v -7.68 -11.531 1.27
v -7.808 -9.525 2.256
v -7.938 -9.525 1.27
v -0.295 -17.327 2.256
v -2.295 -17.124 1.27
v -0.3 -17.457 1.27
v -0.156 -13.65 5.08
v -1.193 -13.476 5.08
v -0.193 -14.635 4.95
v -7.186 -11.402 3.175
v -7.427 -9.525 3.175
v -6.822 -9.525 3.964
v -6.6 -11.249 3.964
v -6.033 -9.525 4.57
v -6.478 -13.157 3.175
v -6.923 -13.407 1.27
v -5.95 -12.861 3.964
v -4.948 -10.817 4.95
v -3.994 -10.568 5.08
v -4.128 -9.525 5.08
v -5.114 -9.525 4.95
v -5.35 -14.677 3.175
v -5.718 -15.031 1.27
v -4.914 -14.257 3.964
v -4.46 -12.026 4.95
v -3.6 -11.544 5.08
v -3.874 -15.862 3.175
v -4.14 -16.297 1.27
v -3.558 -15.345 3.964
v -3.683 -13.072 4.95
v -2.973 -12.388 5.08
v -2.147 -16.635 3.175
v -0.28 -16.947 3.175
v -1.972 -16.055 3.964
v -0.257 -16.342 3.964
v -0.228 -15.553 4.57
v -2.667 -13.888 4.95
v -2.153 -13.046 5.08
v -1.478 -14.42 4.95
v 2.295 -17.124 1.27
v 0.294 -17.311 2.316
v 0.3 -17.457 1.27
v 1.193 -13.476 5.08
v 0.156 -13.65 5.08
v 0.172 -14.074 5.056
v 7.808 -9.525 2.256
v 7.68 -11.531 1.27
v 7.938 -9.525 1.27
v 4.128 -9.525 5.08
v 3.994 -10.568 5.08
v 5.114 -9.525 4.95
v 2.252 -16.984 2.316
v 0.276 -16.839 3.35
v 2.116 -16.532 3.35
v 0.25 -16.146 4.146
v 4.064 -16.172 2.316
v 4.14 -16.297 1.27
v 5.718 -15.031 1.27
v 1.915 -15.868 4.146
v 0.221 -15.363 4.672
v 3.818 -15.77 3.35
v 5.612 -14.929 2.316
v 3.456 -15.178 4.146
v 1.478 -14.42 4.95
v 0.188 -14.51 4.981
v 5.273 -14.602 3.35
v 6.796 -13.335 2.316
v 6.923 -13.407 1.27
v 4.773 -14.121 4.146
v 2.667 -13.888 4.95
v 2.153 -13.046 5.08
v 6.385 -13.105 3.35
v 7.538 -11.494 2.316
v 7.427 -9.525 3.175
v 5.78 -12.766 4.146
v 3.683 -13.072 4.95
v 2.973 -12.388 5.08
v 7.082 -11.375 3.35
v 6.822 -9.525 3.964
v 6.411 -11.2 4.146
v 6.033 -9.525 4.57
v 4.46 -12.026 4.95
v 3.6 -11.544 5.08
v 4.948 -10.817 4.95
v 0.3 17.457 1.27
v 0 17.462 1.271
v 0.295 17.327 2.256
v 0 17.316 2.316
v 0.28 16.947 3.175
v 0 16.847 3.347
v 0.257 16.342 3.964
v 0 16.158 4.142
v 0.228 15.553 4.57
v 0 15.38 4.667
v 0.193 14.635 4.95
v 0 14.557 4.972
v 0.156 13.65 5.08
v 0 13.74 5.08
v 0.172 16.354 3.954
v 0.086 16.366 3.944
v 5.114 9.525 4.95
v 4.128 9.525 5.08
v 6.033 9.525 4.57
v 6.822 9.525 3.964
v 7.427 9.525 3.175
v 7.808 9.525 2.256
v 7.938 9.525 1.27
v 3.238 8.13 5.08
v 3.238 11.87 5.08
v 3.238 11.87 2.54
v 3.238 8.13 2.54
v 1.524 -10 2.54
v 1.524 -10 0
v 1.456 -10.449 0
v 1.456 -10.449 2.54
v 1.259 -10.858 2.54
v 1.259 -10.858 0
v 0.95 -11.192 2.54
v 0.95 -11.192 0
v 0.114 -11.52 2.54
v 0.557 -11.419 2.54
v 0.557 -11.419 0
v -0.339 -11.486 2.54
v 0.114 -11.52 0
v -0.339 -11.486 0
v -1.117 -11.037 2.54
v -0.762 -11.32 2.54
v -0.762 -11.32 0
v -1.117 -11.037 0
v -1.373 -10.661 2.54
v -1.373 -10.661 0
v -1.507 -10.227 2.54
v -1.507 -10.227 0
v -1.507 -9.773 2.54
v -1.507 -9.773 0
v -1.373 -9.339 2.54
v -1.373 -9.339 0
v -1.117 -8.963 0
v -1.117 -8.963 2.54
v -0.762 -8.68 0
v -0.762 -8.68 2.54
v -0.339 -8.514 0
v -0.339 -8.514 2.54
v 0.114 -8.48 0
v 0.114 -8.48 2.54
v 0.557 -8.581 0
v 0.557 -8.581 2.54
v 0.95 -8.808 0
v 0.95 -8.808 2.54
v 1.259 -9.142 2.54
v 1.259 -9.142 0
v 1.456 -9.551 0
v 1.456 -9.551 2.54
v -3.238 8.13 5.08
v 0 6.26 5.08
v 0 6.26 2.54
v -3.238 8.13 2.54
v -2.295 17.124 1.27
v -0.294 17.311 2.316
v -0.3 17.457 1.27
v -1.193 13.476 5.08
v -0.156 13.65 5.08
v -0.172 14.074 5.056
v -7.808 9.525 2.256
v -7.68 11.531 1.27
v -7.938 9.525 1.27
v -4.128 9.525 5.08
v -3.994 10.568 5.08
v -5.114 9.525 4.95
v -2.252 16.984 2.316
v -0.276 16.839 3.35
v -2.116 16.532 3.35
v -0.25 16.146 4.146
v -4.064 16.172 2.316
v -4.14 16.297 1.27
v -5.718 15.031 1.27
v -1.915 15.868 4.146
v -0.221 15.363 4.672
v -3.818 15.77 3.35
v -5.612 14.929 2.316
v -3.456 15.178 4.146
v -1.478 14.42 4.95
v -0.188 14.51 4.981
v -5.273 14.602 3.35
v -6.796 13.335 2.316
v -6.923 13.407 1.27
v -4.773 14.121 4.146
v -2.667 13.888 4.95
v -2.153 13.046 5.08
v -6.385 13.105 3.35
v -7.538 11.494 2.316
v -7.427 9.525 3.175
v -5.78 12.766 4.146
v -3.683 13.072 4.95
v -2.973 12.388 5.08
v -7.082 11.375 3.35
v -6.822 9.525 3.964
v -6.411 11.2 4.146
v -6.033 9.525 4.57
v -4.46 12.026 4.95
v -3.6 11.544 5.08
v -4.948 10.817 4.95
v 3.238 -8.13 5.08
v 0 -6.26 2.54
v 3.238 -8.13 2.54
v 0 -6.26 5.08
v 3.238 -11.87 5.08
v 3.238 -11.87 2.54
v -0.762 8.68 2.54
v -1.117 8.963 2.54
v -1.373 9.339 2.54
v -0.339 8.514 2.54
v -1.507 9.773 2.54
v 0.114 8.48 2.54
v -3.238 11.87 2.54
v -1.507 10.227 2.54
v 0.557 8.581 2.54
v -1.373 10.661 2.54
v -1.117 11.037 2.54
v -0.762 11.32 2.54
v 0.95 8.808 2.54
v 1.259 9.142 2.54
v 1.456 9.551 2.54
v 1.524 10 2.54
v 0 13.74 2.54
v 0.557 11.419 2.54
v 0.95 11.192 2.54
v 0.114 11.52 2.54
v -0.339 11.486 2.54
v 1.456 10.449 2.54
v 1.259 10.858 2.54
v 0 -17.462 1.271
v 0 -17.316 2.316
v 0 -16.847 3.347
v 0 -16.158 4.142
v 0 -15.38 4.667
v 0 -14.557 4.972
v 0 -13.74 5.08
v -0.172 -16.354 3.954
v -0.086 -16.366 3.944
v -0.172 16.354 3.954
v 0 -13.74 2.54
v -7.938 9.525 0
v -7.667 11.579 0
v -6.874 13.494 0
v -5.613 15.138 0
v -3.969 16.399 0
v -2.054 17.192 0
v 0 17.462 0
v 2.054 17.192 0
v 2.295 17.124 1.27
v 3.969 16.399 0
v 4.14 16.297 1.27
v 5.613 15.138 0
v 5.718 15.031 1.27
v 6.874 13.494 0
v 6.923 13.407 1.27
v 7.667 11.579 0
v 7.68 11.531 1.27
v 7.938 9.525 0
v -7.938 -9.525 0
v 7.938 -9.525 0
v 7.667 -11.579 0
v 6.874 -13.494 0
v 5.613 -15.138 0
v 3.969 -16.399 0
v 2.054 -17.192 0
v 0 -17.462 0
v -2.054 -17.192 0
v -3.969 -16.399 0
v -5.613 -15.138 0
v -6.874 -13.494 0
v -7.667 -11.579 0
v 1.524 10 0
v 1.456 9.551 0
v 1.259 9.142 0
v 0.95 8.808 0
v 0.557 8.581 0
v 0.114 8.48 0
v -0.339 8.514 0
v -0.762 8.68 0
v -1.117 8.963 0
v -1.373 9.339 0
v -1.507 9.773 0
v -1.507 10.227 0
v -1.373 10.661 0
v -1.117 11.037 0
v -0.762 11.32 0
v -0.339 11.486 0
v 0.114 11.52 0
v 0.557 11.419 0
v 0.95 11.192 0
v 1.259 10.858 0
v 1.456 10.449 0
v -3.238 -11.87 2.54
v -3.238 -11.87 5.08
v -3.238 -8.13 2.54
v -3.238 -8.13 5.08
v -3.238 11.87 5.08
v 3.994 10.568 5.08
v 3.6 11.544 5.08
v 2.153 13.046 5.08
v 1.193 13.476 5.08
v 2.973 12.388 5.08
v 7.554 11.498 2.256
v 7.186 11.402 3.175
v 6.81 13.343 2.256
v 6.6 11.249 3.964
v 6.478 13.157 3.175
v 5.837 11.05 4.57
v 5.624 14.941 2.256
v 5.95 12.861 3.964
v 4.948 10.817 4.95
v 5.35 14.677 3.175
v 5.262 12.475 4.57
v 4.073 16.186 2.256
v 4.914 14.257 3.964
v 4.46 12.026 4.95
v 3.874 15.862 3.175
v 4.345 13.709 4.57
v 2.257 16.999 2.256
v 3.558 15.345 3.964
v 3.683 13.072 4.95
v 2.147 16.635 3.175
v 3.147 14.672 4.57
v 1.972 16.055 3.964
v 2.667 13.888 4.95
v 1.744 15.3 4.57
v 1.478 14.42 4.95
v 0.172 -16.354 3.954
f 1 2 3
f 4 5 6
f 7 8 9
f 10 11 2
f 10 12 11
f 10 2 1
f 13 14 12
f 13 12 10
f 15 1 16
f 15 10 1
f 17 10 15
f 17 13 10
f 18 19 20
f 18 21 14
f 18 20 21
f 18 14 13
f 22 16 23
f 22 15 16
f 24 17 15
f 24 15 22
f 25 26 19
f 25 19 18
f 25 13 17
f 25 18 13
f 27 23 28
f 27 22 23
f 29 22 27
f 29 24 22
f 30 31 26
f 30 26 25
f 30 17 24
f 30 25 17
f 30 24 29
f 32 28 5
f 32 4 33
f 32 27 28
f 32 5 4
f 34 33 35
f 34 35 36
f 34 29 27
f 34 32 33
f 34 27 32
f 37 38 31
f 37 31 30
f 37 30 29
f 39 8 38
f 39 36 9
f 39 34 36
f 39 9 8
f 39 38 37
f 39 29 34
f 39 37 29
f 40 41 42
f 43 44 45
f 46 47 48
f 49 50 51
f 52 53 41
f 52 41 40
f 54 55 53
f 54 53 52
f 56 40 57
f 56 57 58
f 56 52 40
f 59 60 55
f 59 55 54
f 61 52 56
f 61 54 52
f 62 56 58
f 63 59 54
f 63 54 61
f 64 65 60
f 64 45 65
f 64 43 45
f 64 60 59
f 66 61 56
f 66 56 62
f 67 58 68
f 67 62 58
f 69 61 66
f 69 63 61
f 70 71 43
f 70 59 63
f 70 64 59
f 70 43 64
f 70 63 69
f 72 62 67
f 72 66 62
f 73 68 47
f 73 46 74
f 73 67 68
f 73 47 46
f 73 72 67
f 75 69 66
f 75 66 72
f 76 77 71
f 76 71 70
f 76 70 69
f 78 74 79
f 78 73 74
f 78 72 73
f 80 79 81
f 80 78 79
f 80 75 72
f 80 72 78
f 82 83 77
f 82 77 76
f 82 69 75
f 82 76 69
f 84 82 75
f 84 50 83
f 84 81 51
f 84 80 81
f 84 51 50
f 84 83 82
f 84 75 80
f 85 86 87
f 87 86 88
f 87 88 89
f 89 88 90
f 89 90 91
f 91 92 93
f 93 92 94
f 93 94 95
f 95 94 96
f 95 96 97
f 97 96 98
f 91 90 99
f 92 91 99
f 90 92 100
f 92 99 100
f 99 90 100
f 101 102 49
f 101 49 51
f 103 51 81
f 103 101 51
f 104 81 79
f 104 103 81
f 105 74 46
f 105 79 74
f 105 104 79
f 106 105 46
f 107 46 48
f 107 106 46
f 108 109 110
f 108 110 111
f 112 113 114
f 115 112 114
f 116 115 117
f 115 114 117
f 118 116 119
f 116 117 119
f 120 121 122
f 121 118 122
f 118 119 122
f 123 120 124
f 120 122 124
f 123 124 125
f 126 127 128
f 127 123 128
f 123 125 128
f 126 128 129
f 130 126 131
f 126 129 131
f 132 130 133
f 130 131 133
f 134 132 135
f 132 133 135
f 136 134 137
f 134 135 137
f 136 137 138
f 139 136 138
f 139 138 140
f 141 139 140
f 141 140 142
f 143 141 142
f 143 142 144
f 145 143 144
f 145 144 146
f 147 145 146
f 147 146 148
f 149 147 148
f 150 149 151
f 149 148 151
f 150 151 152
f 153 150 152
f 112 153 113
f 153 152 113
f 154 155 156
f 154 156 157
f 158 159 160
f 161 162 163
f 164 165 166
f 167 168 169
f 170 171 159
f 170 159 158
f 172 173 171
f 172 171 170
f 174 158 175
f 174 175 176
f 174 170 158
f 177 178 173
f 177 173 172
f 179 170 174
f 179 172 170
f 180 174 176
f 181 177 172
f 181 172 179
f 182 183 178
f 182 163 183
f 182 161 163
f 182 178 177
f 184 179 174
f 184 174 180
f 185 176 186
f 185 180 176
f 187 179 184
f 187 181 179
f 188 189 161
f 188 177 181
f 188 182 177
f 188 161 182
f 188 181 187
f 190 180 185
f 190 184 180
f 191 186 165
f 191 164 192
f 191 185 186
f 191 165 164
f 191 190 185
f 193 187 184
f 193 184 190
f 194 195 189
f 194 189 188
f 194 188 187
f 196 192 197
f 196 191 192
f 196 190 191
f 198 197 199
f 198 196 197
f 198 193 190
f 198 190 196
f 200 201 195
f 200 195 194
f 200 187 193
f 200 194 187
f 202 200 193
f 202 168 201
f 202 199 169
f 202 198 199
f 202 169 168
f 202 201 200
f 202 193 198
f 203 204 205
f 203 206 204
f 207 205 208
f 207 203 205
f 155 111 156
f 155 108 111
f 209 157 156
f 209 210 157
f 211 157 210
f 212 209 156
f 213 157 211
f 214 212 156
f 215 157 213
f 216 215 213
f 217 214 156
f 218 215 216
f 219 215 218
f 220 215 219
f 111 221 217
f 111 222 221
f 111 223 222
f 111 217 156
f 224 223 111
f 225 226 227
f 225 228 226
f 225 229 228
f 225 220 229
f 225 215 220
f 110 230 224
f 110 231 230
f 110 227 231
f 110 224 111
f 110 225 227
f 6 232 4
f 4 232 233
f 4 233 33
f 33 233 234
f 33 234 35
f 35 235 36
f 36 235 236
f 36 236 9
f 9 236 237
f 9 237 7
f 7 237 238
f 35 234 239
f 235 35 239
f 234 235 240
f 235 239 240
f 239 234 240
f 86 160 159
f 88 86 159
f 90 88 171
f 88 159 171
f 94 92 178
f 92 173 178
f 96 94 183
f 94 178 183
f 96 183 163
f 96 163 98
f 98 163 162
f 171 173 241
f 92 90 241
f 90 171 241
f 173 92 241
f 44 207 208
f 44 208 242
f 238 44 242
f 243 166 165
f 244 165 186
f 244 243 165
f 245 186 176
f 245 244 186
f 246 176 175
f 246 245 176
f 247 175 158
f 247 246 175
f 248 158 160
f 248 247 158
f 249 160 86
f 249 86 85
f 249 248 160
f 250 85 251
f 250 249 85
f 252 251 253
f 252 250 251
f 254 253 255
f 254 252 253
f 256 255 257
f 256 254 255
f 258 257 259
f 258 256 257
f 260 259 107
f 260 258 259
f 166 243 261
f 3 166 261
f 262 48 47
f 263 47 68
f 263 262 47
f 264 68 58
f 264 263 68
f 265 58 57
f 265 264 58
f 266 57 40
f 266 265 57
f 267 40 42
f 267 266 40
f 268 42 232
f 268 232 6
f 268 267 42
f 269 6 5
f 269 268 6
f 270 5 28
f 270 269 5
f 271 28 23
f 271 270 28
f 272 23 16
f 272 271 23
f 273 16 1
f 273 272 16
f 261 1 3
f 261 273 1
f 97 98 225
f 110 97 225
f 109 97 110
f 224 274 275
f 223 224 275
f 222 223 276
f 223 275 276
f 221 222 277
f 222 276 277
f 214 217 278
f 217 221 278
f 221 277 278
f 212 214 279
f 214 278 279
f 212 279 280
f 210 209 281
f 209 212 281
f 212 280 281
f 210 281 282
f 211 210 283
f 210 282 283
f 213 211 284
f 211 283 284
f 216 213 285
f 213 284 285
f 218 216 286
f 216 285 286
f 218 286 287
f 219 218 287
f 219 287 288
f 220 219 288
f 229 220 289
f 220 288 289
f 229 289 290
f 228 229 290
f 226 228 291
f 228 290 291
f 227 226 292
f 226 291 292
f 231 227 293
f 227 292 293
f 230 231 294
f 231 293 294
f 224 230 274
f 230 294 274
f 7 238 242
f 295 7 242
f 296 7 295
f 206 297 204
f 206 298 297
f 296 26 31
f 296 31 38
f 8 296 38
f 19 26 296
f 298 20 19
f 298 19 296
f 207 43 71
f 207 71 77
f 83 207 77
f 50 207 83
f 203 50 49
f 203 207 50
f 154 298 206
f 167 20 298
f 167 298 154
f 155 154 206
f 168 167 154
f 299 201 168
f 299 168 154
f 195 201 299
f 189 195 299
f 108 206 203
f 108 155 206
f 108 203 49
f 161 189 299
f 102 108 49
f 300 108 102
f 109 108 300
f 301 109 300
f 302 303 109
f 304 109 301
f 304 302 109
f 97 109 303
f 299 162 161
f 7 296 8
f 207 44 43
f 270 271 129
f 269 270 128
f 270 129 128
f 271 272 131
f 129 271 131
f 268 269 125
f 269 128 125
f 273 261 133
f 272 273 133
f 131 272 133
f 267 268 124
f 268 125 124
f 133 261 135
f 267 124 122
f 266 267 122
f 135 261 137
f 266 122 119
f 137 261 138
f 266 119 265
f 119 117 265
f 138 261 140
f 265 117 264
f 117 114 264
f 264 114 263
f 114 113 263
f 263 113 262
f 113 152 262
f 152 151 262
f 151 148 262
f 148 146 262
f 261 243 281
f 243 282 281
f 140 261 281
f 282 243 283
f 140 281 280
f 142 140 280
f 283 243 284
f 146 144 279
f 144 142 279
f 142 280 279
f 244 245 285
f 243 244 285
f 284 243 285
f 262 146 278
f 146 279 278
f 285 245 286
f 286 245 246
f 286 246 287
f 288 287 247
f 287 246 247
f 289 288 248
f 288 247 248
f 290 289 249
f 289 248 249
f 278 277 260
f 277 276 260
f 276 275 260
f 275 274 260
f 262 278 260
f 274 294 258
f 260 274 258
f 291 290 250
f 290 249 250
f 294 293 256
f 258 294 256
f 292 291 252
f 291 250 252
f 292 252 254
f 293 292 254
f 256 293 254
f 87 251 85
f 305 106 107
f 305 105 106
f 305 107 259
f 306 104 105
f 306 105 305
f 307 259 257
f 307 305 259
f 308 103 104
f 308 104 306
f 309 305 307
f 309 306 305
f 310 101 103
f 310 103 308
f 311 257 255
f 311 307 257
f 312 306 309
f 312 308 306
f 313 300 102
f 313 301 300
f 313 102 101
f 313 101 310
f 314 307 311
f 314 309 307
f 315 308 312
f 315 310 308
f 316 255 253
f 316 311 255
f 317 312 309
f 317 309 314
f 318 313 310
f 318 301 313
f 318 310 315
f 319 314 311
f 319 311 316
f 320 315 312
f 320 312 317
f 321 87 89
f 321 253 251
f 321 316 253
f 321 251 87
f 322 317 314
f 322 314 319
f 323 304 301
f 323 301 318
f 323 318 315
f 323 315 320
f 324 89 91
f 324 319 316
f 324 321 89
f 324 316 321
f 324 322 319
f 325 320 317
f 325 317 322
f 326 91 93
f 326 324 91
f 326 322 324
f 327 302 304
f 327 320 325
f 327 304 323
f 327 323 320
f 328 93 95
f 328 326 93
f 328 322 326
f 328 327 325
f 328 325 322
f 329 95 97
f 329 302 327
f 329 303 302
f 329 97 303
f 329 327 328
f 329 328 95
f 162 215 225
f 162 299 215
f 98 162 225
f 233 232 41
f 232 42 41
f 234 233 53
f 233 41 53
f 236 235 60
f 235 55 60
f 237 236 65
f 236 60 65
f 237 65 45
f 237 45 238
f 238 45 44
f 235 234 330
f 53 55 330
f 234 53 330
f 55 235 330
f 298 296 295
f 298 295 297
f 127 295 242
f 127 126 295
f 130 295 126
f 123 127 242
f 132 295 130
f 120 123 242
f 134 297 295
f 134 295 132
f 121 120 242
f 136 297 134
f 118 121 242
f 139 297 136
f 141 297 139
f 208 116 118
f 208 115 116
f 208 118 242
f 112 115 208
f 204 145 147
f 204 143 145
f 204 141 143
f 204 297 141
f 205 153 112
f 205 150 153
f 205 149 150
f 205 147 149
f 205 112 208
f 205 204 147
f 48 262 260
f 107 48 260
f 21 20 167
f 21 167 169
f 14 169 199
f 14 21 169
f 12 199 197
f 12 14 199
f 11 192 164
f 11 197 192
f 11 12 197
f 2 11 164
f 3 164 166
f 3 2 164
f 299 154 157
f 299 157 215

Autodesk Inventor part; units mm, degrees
ref_plane "YZ Plane" through (0, 0, 0) normal (1, 0, 0) x (0, 1, 0)
ref_plane "XZ Plane" through (0, 0, 0) normal (0, 1, 0) x (-1, 0, 0)
ref_plane "XY Plane" through (0, 0, 0) normal (0, 0, 1) x (1, 0, 0)
sketch "Sketch1" plane through (0, 0, 0) normal (0, 0, 1) x (1, 0, 0)
  line L0 (0, -9.525) -> (0, 9.525) construction
  line L1 (7.9375, -9.525) -> (7.9375, 9.525)
  line L2 (-7.9375, 9.525) -> (-7.9375, -9.525)
  arc A0 (-7.9375, -9.525) -> (7.9375, -9.525) centre (0, -9.525) ccw
  arc A1 (7.9375, 9.525) -> (-7.9375, 9.525) centre (0, 9.525) ccw
  circle A2 centre (0, 10) radius 1.524
  circle A3 centre (0, -10) radius 1.524
  point P0 (0, 0)
  dimension "d0" = 15.875
  dimension "d1" = 3.048
  dimension "d2" = 3.048
  dimension "d3" = 20
  dimension "d4" = 10
  dimension "d5" = 9.525
extrude "Extrusion1" add sketch "Sketch1" along normal blind 5.08
sketch "Sketch2" plane through (0, 0, 5.08) normal (0, 0, 1) x (1, 0, 0)
  circle A0 centre (0, 10) radius 1.524 projected
  circle A1 centre (0, -10) radius 1.524 projected
  line L0 (0, 13.7395) -> (3.2385, 11.8697)
  line L1 (3.2385, 11.8697) -> (3.2385, 8.1302)
  line L2 (3.2385, 8.1302) -> (0, 6.2605)
  line L3 (0, 6.2605) -> (-3.2385, 8.1302)
  line L4 (-3.2385, 8.1302) -> (-3.2385, 11.8697)
  line L5 (-3.2385, 11.8697) -> (0, 13.7395)
  line L6 (0, -6.2605) -> (3.2385, -8.1302)
  line L7 (3.2385, -8.1302) -> (3.2385, -11.8697)
  line L8 (3.2385, -11.8697) -> (0, -13.7395)
  line L9 (0, -13.7395) -> (-3.2385, -11.8697)
  line L10 (-3.2385, -11.8697) -> (-3.2385, -8.1302)
  line L11 (-3.2385, -8.1302) -> (0, -6.2605)
  point P0 (0, 0)
  dimension "d8" = 6.477
extrude "Extrusion2" cut sketch "Sketch2" against normal blind 2.54
fillet "Fillet1" radius 3.81 4 edges at (0, -17.4625, 5.08) (7.9375, 0, 5.08) (0, 17.4625, 5.08) (-7.9375, 0, 5.08)
equation "\"d4\" = 0.5 * d3"
